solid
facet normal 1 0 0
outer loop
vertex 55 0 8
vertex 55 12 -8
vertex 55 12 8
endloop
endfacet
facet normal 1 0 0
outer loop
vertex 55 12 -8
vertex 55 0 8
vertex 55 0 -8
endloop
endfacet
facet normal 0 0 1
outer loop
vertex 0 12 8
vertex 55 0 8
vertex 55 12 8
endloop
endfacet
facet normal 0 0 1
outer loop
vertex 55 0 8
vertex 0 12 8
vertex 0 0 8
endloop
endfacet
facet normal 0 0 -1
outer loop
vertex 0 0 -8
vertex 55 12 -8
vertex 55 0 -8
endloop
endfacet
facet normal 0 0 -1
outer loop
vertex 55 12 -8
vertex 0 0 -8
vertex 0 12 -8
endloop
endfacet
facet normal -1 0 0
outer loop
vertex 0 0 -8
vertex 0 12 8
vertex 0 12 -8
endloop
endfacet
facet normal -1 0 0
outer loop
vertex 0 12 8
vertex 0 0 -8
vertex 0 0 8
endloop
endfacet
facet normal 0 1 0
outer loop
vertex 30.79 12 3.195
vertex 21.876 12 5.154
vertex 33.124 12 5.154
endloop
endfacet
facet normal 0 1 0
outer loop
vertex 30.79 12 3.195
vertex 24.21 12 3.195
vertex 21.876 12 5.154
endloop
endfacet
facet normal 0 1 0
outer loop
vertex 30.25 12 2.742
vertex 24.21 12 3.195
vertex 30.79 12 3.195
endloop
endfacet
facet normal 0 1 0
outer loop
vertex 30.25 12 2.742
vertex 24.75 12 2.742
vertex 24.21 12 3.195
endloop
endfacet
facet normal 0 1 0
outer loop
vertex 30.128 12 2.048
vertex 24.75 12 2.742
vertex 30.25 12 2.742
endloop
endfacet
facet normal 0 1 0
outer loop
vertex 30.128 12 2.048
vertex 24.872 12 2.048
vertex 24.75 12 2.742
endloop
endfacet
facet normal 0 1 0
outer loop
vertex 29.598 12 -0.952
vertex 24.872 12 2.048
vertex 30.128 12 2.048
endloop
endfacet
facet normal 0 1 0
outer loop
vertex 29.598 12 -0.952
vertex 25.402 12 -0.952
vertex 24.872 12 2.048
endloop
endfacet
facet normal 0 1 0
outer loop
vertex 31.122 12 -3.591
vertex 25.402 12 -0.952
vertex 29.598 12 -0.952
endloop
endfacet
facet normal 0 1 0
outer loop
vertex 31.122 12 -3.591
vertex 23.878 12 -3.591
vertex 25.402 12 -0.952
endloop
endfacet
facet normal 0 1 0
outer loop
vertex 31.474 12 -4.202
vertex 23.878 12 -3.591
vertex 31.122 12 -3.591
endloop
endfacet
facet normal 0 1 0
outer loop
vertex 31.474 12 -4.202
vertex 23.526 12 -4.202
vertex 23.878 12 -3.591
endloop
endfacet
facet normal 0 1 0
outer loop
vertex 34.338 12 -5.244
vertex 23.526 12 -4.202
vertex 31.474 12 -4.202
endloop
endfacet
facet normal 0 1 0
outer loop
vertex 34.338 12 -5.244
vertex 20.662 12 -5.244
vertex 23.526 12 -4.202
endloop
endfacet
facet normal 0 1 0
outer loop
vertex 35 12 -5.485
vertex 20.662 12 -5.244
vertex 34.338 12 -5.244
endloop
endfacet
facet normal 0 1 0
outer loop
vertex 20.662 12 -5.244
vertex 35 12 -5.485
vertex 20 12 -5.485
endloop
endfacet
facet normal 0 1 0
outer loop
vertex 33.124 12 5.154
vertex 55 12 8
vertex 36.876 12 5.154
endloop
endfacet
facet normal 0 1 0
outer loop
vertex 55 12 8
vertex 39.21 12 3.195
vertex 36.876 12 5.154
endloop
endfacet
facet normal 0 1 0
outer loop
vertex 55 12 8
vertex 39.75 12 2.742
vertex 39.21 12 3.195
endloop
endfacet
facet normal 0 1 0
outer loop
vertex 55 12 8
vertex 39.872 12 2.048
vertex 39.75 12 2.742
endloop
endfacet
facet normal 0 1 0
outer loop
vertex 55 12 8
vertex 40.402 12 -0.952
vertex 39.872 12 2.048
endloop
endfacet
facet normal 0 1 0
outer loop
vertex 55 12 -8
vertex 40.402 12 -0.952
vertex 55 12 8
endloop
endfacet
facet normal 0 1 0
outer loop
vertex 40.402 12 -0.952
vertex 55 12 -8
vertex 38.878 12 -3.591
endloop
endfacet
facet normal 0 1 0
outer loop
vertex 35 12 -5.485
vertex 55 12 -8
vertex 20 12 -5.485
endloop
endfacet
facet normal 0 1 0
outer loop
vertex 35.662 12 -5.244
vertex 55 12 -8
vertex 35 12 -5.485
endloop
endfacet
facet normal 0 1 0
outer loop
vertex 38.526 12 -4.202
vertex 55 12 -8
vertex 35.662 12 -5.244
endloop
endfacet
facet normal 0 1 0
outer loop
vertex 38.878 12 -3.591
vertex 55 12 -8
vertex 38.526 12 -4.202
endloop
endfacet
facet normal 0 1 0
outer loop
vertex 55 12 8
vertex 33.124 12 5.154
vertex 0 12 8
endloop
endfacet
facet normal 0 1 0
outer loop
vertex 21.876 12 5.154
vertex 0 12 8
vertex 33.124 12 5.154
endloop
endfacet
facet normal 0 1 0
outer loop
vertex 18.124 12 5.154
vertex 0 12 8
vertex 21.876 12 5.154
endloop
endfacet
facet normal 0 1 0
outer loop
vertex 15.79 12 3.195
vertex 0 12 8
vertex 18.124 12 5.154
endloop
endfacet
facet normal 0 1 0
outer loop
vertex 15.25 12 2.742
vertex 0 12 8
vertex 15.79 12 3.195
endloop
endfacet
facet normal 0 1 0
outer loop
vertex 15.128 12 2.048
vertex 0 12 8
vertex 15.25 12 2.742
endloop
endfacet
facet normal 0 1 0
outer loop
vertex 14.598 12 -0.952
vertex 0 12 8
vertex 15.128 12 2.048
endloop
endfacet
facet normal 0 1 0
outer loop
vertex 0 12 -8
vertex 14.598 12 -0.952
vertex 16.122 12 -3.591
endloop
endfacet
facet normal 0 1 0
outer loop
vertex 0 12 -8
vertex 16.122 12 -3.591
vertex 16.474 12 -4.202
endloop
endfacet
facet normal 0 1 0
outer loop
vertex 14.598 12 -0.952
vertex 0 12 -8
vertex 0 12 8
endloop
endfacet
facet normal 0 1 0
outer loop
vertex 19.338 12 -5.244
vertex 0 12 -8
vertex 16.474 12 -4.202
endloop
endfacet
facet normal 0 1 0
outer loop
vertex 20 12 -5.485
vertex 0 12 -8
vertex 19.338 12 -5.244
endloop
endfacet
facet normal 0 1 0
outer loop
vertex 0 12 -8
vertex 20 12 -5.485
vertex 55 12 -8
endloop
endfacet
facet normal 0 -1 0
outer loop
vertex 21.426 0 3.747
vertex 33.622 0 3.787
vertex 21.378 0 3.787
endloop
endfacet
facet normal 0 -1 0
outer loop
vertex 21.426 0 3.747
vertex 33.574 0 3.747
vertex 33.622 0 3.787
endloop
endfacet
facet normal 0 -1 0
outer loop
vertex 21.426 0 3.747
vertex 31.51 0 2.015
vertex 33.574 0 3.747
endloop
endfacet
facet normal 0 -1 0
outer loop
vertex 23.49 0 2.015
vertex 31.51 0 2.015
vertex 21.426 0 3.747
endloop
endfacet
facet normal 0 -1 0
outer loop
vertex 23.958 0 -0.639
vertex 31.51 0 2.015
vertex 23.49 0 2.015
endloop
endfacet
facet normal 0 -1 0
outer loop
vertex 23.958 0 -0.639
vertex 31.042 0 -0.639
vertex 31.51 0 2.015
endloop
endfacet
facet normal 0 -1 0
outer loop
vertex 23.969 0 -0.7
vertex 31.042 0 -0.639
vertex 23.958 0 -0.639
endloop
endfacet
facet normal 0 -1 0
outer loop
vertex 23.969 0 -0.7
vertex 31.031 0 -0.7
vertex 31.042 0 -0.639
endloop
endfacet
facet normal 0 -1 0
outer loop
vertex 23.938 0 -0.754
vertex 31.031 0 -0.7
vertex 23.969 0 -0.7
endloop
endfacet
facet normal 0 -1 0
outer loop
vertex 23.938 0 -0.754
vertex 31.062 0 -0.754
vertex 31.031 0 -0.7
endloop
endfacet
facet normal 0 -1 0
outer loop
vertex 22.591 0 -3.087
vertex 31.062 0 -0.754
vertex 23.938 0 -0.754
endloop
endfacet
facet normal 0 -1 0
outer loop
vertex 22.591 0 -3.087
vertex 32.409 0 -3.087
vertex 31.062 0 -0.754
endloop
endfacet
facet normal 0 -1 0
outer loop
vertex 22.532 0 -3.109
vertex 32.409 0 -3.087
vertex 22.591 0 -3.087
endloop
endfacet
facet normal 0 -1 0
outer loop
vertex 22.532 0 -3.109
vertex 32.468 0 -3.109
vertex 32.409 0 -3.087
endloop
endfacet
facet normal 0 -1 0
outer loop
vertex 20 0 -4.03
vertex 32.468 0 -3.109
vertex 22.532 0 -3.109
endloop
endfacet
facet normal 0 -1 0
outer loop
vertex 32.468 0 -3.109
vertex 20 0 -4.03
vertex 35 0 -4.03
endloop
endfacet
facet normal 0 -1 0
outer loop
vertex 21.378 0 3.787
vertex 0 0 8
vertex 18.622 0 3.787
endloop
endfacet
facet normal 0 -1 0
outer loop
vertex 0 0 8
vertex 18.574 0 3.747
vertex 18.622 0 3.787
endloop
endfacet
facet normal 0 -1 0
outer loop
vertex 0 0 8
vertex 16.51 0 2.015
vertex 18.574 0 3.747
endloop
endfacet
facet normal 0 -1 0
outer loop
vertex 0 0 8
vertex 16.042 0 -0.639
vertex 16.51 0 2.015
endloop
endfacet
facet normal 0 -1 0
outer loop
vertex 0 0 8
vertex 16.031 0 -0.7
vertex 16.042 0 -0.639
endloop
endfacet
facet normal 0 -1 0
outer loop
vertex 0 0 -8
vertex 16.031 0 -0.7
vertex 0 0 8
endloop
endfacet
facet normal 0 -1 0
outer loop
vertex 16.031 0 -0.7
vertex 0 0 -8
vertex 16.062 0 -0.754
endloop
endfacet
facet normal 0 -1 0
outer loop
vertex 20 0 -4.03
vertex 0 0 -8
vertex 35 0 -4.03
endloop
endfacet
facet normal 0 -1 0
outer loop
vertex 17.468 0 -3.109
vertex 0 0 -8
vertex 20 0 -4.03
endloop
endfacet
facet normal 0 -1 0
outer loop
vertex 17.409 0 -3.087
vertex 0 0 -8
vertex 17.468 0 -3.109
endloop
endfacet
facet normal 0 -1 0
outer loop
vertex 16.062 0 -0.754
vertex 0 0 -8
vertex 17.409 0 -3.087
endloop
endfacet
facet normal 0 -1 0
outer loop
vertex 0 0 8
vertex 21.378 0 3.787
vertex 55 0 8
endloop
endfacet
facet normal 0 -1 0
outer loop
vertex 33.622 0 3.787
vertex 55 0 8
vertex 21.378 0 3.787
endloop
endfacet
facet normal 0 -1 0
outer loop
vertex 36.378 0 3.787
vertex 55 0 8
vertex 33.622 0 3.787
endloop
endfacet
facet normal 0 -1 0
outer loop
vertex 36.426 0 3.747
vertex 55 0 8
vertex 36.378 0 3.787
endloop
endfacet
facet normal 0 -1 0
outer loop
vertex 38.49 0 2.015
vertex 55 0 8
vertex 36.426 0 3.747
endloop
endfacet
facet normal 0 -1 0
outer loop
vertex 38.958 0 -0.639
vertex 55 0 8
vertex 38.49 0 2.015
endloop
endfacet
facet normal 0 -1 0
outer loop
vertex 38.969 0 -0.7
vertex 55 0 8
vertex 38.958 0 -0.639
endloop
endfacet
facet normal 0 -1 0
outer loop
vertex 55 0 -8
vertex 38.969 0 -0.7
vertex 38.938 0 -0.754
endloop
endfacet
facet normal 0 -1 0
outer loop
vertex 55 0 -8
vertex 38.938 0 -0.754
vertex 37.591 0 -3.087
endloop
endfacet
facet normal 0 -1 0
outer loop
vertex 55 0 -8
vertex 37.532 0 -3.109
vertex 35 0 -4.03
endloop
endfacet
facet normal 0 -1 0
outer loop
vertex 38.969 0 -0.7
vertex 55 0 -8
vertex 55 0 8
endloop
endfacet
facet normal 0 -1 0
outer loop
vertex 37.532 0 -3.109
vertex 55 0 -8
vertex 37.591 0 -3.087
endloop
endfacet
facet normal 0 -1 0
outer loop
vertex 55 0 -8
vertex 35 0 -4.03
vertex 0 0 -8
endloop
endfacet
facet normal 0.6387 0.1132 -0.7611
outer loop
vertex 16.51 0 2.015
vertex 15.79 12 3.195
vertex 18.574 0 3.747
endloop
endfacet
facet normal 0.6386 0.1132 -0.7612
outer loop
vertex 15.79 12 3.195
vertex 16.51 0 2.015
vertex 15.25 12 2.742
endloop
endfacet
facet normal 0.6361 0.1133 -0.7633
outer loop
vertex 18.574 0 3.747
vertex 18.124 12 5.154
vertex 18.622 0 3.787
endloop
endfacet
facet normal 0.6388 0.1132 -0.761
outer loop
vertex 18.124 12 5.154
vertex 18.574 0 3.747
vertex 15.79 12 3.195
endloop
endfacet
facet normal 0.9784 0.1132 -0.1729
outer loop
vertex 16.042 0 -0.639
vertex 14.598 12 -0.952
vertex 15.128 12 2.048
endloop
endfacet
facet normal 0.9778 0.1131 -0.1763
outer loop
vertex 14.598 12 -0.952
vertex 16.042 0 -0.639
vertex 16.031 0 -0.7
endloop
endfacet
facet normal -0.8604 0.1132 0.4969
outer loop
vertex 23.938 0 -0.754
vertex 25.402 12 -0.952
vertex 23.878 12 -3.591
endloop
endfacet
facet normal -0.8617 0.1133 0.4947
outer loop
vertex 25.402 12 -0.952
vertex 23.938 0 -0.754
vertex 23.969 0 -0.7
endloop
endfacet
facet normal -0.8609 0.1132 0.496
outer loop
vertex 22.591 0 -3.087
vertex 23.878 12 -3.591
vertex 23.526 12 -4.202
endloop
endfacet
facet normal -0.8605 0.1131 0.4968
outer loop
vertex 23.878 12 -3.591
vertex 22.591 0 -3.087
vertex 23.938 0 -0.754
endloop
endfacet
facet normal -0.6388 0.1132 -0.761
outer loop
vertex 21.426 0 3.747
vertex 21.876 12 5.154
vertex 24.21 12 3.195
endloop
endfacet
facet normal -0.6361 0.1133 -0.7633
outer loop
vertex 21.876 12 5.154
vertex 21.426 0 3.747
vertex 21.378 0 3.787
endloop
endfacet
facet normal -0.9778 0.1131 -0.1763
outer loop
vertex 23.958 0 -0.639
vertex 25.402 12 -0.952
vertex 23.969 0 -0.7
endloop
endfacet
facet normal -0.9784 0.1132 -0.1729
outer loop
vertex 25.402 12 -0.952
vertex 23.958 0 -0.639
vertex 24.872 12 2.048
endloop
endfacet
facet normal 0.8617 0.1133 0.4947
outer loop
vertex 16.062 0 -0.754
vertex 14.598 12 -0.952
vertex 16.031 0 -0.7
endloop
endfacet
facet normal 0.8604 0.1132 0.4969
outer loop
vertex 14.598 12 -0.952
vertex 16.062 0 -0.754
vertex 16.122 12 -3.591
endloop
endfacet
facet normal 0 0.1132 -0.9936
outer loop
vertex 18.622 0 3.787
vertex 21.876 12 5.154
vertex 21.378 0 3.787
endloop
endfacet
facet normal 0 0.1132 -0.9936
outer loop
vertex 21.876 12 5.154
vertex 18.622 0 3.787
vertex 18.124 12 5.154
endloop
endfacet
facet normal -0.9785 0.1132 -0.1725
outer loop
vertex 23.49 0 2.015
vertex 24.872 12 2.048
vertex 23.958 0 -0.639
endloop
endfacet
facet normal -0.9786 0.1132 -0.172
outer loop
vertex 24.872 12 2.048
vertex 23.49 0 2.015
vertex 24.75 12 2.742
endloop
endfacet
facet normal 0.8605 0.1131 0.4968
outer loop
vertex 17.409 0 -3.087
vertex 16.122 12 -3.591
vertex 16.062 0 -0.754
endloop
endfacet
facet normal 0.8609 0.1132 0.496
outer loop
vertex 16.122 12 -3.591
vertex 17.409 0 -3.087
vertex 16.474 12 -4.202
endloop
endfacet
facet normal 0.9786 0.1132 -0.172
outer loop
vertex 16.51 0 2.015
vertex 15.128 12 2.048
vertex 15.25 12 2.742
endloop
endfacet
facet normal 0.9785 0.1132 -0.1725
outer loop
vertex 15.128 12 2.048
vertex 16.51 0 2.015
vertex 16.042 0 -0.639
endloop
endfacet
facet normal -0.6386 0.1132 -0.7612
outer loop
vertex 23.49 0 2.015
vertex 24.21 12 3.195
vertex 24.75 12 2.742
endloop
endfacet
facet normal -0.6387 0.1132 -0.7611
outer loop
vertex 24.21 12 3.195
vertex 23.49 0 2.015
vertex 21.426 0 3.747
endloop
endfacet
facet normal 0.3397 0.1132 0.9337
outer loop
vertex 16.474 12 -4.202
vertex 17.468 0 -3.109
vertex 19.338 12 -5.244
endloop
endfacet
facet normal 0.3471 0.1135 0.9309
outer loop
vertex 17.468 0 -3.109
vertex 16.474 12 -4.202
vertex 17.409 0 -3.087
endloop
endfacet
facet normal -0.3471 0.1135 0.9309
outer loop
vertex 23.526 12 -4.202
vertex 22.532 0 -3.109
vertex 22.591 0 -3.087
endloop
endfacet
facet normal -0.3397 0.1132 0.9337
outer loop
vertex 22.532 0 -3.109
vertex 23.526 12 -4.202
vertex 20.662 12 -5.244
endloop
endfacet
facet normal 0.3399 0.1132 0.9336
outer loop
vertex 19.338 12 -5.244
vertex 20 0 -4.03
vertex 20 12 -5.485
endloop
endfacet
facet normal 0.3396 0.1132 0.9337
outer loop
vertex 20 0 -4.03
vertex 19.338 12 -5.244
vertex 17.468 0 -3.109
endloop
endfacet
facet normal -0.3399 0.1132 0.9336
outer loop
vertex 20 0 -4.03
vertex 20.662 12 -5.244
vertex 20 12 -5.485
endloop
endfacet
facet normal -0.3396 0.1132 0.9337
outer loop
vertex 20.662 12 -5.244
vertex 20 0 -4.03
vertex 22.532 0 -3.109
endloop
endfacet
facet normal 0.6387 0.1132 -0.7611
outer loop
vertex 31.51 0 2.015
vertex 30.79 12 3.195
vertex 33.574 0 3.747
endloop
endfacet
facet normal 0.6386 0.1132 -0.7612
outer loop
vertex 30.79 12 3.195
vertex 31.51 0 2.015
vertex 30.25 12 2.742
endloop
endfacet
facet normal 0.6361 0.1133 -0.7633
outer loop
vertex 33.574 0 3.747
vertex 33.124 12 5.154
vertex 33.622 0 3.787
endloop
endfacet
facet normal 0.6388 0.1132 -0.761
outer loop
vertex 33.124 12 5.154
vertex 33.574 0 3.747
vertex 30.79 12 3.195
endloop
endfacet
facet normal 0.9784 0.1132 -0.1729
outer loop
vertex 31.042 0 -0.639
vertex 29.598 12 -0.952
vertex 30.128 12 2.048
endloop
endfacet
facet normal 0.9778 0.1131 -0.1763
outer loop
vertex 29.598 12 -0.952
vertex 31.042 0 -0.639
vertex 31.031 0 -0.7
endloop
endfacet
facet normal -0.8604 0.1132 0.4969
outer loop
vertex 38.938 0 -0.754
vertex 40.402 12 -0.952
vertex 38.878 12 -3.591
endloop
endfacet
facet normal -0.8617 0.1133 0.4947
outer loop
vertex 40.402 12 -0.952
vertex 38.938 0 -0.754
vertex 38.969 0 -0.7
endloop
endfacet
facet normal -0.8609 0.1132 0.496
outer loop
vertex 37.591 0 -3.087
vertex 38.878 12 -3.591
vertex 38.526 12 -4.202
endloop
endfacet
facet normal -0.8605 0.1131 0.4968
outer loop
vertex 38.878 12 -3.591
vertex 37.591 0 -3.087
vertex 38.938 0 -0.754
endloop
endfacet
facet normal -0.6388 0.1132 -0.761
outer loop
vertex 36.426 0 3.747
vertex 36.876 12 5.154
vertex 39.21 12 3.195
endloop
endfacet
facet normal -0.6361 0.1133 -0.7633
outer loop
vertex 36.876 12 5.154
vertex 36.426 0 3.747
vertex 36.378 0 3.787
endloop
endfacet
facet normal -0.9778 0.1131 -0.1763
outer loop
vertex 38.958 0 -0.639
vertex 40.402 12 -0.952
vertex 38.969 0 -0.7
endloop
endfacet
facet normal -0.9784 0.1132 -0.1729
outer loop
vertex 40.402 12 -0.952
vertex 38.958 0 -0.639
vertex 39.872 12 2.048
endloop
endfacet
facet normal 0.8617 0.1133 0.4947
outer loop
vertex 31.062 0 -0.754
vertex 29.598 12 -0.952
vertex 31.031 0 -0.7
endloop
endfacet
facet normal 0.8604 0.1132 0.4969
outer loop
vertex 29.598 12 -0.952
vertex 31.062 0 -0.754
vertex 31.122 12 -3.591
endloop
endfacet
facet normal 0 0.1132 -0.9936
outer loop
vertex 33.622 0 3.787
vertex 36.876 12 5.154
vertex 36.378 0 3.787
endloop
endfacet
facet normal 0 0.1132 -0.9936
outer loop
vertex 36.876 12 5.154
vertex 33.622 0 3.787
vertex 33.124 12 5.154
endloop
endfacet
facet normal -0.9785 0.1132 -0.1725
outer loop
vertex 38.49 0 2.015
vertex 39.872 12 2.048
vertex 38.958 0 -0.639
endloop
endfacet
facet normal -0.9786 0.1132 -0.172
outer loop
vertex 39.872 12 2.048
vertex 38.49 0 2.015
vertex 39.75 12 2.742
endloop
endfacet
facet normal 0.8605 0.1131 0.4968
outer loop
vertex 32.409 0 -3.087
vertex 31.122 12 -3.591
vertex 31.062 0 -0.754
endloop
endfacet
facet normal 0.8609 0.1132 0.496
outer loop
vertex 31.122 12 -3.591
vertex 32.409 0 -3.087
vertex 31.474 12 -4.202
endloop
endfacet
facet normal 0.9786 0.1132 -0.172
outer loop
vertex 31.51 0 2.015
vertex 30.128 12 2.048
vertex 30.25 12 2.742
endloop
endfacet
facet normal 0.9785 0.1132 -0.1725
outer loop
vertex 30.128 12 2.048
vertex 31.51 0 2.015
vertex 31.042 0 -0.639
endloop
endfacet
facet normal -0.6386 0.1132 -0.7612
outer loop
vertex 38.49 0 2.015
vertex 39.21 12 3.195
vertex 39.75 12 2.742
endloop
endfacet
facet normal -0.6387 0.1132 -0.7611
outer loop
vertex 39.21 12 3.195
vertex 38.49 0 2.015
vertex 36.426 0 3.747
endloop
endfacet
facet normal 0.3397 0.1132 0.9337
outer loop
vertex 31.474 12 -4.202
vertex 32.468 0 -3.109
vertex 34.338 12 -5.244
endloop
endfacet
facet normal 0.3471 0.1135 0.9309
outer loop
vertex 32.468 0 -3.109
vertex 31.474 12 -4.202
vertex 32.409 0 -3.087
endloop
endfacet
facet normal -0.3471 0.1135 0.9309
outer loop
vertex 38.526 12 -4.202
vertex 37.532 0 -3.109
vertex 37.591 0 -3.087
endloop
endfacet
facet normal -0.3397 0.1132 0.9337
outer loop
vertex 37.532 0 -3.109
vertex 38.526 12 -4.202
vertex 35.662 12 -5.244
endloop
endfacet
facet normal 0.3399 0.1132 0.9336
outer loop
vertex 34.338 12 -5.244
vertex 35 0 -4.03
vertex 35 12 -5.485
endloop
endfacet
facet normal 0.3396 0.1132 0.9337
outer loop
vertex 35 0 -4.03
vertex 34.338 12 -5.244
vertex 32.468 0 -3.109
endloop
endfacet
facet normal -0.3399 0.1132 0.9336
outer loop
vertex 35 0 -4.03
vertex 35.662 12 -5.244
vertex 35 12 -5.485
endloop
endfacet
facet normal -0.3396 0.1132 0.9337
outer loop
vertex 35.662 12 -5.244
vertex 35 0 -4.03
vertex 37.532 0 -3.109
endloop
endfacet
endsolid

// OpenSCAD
//cube([55,12,16]);

module lg_nongon() {
translate([0,-.25,0])
  rotate([-90,10,0])
  cylinder(d1=8, 
           d2=12, 
           h=16.5, 
           $fn=9);    
}

module beam() {
translate([0,0,-8])  
  cube([55,12,16]); //Test Beam
}

difference() {
beam();
  translate([20,0,0]) lg_nongon();
  translate([35,0,0]) lg_nongon();
}
